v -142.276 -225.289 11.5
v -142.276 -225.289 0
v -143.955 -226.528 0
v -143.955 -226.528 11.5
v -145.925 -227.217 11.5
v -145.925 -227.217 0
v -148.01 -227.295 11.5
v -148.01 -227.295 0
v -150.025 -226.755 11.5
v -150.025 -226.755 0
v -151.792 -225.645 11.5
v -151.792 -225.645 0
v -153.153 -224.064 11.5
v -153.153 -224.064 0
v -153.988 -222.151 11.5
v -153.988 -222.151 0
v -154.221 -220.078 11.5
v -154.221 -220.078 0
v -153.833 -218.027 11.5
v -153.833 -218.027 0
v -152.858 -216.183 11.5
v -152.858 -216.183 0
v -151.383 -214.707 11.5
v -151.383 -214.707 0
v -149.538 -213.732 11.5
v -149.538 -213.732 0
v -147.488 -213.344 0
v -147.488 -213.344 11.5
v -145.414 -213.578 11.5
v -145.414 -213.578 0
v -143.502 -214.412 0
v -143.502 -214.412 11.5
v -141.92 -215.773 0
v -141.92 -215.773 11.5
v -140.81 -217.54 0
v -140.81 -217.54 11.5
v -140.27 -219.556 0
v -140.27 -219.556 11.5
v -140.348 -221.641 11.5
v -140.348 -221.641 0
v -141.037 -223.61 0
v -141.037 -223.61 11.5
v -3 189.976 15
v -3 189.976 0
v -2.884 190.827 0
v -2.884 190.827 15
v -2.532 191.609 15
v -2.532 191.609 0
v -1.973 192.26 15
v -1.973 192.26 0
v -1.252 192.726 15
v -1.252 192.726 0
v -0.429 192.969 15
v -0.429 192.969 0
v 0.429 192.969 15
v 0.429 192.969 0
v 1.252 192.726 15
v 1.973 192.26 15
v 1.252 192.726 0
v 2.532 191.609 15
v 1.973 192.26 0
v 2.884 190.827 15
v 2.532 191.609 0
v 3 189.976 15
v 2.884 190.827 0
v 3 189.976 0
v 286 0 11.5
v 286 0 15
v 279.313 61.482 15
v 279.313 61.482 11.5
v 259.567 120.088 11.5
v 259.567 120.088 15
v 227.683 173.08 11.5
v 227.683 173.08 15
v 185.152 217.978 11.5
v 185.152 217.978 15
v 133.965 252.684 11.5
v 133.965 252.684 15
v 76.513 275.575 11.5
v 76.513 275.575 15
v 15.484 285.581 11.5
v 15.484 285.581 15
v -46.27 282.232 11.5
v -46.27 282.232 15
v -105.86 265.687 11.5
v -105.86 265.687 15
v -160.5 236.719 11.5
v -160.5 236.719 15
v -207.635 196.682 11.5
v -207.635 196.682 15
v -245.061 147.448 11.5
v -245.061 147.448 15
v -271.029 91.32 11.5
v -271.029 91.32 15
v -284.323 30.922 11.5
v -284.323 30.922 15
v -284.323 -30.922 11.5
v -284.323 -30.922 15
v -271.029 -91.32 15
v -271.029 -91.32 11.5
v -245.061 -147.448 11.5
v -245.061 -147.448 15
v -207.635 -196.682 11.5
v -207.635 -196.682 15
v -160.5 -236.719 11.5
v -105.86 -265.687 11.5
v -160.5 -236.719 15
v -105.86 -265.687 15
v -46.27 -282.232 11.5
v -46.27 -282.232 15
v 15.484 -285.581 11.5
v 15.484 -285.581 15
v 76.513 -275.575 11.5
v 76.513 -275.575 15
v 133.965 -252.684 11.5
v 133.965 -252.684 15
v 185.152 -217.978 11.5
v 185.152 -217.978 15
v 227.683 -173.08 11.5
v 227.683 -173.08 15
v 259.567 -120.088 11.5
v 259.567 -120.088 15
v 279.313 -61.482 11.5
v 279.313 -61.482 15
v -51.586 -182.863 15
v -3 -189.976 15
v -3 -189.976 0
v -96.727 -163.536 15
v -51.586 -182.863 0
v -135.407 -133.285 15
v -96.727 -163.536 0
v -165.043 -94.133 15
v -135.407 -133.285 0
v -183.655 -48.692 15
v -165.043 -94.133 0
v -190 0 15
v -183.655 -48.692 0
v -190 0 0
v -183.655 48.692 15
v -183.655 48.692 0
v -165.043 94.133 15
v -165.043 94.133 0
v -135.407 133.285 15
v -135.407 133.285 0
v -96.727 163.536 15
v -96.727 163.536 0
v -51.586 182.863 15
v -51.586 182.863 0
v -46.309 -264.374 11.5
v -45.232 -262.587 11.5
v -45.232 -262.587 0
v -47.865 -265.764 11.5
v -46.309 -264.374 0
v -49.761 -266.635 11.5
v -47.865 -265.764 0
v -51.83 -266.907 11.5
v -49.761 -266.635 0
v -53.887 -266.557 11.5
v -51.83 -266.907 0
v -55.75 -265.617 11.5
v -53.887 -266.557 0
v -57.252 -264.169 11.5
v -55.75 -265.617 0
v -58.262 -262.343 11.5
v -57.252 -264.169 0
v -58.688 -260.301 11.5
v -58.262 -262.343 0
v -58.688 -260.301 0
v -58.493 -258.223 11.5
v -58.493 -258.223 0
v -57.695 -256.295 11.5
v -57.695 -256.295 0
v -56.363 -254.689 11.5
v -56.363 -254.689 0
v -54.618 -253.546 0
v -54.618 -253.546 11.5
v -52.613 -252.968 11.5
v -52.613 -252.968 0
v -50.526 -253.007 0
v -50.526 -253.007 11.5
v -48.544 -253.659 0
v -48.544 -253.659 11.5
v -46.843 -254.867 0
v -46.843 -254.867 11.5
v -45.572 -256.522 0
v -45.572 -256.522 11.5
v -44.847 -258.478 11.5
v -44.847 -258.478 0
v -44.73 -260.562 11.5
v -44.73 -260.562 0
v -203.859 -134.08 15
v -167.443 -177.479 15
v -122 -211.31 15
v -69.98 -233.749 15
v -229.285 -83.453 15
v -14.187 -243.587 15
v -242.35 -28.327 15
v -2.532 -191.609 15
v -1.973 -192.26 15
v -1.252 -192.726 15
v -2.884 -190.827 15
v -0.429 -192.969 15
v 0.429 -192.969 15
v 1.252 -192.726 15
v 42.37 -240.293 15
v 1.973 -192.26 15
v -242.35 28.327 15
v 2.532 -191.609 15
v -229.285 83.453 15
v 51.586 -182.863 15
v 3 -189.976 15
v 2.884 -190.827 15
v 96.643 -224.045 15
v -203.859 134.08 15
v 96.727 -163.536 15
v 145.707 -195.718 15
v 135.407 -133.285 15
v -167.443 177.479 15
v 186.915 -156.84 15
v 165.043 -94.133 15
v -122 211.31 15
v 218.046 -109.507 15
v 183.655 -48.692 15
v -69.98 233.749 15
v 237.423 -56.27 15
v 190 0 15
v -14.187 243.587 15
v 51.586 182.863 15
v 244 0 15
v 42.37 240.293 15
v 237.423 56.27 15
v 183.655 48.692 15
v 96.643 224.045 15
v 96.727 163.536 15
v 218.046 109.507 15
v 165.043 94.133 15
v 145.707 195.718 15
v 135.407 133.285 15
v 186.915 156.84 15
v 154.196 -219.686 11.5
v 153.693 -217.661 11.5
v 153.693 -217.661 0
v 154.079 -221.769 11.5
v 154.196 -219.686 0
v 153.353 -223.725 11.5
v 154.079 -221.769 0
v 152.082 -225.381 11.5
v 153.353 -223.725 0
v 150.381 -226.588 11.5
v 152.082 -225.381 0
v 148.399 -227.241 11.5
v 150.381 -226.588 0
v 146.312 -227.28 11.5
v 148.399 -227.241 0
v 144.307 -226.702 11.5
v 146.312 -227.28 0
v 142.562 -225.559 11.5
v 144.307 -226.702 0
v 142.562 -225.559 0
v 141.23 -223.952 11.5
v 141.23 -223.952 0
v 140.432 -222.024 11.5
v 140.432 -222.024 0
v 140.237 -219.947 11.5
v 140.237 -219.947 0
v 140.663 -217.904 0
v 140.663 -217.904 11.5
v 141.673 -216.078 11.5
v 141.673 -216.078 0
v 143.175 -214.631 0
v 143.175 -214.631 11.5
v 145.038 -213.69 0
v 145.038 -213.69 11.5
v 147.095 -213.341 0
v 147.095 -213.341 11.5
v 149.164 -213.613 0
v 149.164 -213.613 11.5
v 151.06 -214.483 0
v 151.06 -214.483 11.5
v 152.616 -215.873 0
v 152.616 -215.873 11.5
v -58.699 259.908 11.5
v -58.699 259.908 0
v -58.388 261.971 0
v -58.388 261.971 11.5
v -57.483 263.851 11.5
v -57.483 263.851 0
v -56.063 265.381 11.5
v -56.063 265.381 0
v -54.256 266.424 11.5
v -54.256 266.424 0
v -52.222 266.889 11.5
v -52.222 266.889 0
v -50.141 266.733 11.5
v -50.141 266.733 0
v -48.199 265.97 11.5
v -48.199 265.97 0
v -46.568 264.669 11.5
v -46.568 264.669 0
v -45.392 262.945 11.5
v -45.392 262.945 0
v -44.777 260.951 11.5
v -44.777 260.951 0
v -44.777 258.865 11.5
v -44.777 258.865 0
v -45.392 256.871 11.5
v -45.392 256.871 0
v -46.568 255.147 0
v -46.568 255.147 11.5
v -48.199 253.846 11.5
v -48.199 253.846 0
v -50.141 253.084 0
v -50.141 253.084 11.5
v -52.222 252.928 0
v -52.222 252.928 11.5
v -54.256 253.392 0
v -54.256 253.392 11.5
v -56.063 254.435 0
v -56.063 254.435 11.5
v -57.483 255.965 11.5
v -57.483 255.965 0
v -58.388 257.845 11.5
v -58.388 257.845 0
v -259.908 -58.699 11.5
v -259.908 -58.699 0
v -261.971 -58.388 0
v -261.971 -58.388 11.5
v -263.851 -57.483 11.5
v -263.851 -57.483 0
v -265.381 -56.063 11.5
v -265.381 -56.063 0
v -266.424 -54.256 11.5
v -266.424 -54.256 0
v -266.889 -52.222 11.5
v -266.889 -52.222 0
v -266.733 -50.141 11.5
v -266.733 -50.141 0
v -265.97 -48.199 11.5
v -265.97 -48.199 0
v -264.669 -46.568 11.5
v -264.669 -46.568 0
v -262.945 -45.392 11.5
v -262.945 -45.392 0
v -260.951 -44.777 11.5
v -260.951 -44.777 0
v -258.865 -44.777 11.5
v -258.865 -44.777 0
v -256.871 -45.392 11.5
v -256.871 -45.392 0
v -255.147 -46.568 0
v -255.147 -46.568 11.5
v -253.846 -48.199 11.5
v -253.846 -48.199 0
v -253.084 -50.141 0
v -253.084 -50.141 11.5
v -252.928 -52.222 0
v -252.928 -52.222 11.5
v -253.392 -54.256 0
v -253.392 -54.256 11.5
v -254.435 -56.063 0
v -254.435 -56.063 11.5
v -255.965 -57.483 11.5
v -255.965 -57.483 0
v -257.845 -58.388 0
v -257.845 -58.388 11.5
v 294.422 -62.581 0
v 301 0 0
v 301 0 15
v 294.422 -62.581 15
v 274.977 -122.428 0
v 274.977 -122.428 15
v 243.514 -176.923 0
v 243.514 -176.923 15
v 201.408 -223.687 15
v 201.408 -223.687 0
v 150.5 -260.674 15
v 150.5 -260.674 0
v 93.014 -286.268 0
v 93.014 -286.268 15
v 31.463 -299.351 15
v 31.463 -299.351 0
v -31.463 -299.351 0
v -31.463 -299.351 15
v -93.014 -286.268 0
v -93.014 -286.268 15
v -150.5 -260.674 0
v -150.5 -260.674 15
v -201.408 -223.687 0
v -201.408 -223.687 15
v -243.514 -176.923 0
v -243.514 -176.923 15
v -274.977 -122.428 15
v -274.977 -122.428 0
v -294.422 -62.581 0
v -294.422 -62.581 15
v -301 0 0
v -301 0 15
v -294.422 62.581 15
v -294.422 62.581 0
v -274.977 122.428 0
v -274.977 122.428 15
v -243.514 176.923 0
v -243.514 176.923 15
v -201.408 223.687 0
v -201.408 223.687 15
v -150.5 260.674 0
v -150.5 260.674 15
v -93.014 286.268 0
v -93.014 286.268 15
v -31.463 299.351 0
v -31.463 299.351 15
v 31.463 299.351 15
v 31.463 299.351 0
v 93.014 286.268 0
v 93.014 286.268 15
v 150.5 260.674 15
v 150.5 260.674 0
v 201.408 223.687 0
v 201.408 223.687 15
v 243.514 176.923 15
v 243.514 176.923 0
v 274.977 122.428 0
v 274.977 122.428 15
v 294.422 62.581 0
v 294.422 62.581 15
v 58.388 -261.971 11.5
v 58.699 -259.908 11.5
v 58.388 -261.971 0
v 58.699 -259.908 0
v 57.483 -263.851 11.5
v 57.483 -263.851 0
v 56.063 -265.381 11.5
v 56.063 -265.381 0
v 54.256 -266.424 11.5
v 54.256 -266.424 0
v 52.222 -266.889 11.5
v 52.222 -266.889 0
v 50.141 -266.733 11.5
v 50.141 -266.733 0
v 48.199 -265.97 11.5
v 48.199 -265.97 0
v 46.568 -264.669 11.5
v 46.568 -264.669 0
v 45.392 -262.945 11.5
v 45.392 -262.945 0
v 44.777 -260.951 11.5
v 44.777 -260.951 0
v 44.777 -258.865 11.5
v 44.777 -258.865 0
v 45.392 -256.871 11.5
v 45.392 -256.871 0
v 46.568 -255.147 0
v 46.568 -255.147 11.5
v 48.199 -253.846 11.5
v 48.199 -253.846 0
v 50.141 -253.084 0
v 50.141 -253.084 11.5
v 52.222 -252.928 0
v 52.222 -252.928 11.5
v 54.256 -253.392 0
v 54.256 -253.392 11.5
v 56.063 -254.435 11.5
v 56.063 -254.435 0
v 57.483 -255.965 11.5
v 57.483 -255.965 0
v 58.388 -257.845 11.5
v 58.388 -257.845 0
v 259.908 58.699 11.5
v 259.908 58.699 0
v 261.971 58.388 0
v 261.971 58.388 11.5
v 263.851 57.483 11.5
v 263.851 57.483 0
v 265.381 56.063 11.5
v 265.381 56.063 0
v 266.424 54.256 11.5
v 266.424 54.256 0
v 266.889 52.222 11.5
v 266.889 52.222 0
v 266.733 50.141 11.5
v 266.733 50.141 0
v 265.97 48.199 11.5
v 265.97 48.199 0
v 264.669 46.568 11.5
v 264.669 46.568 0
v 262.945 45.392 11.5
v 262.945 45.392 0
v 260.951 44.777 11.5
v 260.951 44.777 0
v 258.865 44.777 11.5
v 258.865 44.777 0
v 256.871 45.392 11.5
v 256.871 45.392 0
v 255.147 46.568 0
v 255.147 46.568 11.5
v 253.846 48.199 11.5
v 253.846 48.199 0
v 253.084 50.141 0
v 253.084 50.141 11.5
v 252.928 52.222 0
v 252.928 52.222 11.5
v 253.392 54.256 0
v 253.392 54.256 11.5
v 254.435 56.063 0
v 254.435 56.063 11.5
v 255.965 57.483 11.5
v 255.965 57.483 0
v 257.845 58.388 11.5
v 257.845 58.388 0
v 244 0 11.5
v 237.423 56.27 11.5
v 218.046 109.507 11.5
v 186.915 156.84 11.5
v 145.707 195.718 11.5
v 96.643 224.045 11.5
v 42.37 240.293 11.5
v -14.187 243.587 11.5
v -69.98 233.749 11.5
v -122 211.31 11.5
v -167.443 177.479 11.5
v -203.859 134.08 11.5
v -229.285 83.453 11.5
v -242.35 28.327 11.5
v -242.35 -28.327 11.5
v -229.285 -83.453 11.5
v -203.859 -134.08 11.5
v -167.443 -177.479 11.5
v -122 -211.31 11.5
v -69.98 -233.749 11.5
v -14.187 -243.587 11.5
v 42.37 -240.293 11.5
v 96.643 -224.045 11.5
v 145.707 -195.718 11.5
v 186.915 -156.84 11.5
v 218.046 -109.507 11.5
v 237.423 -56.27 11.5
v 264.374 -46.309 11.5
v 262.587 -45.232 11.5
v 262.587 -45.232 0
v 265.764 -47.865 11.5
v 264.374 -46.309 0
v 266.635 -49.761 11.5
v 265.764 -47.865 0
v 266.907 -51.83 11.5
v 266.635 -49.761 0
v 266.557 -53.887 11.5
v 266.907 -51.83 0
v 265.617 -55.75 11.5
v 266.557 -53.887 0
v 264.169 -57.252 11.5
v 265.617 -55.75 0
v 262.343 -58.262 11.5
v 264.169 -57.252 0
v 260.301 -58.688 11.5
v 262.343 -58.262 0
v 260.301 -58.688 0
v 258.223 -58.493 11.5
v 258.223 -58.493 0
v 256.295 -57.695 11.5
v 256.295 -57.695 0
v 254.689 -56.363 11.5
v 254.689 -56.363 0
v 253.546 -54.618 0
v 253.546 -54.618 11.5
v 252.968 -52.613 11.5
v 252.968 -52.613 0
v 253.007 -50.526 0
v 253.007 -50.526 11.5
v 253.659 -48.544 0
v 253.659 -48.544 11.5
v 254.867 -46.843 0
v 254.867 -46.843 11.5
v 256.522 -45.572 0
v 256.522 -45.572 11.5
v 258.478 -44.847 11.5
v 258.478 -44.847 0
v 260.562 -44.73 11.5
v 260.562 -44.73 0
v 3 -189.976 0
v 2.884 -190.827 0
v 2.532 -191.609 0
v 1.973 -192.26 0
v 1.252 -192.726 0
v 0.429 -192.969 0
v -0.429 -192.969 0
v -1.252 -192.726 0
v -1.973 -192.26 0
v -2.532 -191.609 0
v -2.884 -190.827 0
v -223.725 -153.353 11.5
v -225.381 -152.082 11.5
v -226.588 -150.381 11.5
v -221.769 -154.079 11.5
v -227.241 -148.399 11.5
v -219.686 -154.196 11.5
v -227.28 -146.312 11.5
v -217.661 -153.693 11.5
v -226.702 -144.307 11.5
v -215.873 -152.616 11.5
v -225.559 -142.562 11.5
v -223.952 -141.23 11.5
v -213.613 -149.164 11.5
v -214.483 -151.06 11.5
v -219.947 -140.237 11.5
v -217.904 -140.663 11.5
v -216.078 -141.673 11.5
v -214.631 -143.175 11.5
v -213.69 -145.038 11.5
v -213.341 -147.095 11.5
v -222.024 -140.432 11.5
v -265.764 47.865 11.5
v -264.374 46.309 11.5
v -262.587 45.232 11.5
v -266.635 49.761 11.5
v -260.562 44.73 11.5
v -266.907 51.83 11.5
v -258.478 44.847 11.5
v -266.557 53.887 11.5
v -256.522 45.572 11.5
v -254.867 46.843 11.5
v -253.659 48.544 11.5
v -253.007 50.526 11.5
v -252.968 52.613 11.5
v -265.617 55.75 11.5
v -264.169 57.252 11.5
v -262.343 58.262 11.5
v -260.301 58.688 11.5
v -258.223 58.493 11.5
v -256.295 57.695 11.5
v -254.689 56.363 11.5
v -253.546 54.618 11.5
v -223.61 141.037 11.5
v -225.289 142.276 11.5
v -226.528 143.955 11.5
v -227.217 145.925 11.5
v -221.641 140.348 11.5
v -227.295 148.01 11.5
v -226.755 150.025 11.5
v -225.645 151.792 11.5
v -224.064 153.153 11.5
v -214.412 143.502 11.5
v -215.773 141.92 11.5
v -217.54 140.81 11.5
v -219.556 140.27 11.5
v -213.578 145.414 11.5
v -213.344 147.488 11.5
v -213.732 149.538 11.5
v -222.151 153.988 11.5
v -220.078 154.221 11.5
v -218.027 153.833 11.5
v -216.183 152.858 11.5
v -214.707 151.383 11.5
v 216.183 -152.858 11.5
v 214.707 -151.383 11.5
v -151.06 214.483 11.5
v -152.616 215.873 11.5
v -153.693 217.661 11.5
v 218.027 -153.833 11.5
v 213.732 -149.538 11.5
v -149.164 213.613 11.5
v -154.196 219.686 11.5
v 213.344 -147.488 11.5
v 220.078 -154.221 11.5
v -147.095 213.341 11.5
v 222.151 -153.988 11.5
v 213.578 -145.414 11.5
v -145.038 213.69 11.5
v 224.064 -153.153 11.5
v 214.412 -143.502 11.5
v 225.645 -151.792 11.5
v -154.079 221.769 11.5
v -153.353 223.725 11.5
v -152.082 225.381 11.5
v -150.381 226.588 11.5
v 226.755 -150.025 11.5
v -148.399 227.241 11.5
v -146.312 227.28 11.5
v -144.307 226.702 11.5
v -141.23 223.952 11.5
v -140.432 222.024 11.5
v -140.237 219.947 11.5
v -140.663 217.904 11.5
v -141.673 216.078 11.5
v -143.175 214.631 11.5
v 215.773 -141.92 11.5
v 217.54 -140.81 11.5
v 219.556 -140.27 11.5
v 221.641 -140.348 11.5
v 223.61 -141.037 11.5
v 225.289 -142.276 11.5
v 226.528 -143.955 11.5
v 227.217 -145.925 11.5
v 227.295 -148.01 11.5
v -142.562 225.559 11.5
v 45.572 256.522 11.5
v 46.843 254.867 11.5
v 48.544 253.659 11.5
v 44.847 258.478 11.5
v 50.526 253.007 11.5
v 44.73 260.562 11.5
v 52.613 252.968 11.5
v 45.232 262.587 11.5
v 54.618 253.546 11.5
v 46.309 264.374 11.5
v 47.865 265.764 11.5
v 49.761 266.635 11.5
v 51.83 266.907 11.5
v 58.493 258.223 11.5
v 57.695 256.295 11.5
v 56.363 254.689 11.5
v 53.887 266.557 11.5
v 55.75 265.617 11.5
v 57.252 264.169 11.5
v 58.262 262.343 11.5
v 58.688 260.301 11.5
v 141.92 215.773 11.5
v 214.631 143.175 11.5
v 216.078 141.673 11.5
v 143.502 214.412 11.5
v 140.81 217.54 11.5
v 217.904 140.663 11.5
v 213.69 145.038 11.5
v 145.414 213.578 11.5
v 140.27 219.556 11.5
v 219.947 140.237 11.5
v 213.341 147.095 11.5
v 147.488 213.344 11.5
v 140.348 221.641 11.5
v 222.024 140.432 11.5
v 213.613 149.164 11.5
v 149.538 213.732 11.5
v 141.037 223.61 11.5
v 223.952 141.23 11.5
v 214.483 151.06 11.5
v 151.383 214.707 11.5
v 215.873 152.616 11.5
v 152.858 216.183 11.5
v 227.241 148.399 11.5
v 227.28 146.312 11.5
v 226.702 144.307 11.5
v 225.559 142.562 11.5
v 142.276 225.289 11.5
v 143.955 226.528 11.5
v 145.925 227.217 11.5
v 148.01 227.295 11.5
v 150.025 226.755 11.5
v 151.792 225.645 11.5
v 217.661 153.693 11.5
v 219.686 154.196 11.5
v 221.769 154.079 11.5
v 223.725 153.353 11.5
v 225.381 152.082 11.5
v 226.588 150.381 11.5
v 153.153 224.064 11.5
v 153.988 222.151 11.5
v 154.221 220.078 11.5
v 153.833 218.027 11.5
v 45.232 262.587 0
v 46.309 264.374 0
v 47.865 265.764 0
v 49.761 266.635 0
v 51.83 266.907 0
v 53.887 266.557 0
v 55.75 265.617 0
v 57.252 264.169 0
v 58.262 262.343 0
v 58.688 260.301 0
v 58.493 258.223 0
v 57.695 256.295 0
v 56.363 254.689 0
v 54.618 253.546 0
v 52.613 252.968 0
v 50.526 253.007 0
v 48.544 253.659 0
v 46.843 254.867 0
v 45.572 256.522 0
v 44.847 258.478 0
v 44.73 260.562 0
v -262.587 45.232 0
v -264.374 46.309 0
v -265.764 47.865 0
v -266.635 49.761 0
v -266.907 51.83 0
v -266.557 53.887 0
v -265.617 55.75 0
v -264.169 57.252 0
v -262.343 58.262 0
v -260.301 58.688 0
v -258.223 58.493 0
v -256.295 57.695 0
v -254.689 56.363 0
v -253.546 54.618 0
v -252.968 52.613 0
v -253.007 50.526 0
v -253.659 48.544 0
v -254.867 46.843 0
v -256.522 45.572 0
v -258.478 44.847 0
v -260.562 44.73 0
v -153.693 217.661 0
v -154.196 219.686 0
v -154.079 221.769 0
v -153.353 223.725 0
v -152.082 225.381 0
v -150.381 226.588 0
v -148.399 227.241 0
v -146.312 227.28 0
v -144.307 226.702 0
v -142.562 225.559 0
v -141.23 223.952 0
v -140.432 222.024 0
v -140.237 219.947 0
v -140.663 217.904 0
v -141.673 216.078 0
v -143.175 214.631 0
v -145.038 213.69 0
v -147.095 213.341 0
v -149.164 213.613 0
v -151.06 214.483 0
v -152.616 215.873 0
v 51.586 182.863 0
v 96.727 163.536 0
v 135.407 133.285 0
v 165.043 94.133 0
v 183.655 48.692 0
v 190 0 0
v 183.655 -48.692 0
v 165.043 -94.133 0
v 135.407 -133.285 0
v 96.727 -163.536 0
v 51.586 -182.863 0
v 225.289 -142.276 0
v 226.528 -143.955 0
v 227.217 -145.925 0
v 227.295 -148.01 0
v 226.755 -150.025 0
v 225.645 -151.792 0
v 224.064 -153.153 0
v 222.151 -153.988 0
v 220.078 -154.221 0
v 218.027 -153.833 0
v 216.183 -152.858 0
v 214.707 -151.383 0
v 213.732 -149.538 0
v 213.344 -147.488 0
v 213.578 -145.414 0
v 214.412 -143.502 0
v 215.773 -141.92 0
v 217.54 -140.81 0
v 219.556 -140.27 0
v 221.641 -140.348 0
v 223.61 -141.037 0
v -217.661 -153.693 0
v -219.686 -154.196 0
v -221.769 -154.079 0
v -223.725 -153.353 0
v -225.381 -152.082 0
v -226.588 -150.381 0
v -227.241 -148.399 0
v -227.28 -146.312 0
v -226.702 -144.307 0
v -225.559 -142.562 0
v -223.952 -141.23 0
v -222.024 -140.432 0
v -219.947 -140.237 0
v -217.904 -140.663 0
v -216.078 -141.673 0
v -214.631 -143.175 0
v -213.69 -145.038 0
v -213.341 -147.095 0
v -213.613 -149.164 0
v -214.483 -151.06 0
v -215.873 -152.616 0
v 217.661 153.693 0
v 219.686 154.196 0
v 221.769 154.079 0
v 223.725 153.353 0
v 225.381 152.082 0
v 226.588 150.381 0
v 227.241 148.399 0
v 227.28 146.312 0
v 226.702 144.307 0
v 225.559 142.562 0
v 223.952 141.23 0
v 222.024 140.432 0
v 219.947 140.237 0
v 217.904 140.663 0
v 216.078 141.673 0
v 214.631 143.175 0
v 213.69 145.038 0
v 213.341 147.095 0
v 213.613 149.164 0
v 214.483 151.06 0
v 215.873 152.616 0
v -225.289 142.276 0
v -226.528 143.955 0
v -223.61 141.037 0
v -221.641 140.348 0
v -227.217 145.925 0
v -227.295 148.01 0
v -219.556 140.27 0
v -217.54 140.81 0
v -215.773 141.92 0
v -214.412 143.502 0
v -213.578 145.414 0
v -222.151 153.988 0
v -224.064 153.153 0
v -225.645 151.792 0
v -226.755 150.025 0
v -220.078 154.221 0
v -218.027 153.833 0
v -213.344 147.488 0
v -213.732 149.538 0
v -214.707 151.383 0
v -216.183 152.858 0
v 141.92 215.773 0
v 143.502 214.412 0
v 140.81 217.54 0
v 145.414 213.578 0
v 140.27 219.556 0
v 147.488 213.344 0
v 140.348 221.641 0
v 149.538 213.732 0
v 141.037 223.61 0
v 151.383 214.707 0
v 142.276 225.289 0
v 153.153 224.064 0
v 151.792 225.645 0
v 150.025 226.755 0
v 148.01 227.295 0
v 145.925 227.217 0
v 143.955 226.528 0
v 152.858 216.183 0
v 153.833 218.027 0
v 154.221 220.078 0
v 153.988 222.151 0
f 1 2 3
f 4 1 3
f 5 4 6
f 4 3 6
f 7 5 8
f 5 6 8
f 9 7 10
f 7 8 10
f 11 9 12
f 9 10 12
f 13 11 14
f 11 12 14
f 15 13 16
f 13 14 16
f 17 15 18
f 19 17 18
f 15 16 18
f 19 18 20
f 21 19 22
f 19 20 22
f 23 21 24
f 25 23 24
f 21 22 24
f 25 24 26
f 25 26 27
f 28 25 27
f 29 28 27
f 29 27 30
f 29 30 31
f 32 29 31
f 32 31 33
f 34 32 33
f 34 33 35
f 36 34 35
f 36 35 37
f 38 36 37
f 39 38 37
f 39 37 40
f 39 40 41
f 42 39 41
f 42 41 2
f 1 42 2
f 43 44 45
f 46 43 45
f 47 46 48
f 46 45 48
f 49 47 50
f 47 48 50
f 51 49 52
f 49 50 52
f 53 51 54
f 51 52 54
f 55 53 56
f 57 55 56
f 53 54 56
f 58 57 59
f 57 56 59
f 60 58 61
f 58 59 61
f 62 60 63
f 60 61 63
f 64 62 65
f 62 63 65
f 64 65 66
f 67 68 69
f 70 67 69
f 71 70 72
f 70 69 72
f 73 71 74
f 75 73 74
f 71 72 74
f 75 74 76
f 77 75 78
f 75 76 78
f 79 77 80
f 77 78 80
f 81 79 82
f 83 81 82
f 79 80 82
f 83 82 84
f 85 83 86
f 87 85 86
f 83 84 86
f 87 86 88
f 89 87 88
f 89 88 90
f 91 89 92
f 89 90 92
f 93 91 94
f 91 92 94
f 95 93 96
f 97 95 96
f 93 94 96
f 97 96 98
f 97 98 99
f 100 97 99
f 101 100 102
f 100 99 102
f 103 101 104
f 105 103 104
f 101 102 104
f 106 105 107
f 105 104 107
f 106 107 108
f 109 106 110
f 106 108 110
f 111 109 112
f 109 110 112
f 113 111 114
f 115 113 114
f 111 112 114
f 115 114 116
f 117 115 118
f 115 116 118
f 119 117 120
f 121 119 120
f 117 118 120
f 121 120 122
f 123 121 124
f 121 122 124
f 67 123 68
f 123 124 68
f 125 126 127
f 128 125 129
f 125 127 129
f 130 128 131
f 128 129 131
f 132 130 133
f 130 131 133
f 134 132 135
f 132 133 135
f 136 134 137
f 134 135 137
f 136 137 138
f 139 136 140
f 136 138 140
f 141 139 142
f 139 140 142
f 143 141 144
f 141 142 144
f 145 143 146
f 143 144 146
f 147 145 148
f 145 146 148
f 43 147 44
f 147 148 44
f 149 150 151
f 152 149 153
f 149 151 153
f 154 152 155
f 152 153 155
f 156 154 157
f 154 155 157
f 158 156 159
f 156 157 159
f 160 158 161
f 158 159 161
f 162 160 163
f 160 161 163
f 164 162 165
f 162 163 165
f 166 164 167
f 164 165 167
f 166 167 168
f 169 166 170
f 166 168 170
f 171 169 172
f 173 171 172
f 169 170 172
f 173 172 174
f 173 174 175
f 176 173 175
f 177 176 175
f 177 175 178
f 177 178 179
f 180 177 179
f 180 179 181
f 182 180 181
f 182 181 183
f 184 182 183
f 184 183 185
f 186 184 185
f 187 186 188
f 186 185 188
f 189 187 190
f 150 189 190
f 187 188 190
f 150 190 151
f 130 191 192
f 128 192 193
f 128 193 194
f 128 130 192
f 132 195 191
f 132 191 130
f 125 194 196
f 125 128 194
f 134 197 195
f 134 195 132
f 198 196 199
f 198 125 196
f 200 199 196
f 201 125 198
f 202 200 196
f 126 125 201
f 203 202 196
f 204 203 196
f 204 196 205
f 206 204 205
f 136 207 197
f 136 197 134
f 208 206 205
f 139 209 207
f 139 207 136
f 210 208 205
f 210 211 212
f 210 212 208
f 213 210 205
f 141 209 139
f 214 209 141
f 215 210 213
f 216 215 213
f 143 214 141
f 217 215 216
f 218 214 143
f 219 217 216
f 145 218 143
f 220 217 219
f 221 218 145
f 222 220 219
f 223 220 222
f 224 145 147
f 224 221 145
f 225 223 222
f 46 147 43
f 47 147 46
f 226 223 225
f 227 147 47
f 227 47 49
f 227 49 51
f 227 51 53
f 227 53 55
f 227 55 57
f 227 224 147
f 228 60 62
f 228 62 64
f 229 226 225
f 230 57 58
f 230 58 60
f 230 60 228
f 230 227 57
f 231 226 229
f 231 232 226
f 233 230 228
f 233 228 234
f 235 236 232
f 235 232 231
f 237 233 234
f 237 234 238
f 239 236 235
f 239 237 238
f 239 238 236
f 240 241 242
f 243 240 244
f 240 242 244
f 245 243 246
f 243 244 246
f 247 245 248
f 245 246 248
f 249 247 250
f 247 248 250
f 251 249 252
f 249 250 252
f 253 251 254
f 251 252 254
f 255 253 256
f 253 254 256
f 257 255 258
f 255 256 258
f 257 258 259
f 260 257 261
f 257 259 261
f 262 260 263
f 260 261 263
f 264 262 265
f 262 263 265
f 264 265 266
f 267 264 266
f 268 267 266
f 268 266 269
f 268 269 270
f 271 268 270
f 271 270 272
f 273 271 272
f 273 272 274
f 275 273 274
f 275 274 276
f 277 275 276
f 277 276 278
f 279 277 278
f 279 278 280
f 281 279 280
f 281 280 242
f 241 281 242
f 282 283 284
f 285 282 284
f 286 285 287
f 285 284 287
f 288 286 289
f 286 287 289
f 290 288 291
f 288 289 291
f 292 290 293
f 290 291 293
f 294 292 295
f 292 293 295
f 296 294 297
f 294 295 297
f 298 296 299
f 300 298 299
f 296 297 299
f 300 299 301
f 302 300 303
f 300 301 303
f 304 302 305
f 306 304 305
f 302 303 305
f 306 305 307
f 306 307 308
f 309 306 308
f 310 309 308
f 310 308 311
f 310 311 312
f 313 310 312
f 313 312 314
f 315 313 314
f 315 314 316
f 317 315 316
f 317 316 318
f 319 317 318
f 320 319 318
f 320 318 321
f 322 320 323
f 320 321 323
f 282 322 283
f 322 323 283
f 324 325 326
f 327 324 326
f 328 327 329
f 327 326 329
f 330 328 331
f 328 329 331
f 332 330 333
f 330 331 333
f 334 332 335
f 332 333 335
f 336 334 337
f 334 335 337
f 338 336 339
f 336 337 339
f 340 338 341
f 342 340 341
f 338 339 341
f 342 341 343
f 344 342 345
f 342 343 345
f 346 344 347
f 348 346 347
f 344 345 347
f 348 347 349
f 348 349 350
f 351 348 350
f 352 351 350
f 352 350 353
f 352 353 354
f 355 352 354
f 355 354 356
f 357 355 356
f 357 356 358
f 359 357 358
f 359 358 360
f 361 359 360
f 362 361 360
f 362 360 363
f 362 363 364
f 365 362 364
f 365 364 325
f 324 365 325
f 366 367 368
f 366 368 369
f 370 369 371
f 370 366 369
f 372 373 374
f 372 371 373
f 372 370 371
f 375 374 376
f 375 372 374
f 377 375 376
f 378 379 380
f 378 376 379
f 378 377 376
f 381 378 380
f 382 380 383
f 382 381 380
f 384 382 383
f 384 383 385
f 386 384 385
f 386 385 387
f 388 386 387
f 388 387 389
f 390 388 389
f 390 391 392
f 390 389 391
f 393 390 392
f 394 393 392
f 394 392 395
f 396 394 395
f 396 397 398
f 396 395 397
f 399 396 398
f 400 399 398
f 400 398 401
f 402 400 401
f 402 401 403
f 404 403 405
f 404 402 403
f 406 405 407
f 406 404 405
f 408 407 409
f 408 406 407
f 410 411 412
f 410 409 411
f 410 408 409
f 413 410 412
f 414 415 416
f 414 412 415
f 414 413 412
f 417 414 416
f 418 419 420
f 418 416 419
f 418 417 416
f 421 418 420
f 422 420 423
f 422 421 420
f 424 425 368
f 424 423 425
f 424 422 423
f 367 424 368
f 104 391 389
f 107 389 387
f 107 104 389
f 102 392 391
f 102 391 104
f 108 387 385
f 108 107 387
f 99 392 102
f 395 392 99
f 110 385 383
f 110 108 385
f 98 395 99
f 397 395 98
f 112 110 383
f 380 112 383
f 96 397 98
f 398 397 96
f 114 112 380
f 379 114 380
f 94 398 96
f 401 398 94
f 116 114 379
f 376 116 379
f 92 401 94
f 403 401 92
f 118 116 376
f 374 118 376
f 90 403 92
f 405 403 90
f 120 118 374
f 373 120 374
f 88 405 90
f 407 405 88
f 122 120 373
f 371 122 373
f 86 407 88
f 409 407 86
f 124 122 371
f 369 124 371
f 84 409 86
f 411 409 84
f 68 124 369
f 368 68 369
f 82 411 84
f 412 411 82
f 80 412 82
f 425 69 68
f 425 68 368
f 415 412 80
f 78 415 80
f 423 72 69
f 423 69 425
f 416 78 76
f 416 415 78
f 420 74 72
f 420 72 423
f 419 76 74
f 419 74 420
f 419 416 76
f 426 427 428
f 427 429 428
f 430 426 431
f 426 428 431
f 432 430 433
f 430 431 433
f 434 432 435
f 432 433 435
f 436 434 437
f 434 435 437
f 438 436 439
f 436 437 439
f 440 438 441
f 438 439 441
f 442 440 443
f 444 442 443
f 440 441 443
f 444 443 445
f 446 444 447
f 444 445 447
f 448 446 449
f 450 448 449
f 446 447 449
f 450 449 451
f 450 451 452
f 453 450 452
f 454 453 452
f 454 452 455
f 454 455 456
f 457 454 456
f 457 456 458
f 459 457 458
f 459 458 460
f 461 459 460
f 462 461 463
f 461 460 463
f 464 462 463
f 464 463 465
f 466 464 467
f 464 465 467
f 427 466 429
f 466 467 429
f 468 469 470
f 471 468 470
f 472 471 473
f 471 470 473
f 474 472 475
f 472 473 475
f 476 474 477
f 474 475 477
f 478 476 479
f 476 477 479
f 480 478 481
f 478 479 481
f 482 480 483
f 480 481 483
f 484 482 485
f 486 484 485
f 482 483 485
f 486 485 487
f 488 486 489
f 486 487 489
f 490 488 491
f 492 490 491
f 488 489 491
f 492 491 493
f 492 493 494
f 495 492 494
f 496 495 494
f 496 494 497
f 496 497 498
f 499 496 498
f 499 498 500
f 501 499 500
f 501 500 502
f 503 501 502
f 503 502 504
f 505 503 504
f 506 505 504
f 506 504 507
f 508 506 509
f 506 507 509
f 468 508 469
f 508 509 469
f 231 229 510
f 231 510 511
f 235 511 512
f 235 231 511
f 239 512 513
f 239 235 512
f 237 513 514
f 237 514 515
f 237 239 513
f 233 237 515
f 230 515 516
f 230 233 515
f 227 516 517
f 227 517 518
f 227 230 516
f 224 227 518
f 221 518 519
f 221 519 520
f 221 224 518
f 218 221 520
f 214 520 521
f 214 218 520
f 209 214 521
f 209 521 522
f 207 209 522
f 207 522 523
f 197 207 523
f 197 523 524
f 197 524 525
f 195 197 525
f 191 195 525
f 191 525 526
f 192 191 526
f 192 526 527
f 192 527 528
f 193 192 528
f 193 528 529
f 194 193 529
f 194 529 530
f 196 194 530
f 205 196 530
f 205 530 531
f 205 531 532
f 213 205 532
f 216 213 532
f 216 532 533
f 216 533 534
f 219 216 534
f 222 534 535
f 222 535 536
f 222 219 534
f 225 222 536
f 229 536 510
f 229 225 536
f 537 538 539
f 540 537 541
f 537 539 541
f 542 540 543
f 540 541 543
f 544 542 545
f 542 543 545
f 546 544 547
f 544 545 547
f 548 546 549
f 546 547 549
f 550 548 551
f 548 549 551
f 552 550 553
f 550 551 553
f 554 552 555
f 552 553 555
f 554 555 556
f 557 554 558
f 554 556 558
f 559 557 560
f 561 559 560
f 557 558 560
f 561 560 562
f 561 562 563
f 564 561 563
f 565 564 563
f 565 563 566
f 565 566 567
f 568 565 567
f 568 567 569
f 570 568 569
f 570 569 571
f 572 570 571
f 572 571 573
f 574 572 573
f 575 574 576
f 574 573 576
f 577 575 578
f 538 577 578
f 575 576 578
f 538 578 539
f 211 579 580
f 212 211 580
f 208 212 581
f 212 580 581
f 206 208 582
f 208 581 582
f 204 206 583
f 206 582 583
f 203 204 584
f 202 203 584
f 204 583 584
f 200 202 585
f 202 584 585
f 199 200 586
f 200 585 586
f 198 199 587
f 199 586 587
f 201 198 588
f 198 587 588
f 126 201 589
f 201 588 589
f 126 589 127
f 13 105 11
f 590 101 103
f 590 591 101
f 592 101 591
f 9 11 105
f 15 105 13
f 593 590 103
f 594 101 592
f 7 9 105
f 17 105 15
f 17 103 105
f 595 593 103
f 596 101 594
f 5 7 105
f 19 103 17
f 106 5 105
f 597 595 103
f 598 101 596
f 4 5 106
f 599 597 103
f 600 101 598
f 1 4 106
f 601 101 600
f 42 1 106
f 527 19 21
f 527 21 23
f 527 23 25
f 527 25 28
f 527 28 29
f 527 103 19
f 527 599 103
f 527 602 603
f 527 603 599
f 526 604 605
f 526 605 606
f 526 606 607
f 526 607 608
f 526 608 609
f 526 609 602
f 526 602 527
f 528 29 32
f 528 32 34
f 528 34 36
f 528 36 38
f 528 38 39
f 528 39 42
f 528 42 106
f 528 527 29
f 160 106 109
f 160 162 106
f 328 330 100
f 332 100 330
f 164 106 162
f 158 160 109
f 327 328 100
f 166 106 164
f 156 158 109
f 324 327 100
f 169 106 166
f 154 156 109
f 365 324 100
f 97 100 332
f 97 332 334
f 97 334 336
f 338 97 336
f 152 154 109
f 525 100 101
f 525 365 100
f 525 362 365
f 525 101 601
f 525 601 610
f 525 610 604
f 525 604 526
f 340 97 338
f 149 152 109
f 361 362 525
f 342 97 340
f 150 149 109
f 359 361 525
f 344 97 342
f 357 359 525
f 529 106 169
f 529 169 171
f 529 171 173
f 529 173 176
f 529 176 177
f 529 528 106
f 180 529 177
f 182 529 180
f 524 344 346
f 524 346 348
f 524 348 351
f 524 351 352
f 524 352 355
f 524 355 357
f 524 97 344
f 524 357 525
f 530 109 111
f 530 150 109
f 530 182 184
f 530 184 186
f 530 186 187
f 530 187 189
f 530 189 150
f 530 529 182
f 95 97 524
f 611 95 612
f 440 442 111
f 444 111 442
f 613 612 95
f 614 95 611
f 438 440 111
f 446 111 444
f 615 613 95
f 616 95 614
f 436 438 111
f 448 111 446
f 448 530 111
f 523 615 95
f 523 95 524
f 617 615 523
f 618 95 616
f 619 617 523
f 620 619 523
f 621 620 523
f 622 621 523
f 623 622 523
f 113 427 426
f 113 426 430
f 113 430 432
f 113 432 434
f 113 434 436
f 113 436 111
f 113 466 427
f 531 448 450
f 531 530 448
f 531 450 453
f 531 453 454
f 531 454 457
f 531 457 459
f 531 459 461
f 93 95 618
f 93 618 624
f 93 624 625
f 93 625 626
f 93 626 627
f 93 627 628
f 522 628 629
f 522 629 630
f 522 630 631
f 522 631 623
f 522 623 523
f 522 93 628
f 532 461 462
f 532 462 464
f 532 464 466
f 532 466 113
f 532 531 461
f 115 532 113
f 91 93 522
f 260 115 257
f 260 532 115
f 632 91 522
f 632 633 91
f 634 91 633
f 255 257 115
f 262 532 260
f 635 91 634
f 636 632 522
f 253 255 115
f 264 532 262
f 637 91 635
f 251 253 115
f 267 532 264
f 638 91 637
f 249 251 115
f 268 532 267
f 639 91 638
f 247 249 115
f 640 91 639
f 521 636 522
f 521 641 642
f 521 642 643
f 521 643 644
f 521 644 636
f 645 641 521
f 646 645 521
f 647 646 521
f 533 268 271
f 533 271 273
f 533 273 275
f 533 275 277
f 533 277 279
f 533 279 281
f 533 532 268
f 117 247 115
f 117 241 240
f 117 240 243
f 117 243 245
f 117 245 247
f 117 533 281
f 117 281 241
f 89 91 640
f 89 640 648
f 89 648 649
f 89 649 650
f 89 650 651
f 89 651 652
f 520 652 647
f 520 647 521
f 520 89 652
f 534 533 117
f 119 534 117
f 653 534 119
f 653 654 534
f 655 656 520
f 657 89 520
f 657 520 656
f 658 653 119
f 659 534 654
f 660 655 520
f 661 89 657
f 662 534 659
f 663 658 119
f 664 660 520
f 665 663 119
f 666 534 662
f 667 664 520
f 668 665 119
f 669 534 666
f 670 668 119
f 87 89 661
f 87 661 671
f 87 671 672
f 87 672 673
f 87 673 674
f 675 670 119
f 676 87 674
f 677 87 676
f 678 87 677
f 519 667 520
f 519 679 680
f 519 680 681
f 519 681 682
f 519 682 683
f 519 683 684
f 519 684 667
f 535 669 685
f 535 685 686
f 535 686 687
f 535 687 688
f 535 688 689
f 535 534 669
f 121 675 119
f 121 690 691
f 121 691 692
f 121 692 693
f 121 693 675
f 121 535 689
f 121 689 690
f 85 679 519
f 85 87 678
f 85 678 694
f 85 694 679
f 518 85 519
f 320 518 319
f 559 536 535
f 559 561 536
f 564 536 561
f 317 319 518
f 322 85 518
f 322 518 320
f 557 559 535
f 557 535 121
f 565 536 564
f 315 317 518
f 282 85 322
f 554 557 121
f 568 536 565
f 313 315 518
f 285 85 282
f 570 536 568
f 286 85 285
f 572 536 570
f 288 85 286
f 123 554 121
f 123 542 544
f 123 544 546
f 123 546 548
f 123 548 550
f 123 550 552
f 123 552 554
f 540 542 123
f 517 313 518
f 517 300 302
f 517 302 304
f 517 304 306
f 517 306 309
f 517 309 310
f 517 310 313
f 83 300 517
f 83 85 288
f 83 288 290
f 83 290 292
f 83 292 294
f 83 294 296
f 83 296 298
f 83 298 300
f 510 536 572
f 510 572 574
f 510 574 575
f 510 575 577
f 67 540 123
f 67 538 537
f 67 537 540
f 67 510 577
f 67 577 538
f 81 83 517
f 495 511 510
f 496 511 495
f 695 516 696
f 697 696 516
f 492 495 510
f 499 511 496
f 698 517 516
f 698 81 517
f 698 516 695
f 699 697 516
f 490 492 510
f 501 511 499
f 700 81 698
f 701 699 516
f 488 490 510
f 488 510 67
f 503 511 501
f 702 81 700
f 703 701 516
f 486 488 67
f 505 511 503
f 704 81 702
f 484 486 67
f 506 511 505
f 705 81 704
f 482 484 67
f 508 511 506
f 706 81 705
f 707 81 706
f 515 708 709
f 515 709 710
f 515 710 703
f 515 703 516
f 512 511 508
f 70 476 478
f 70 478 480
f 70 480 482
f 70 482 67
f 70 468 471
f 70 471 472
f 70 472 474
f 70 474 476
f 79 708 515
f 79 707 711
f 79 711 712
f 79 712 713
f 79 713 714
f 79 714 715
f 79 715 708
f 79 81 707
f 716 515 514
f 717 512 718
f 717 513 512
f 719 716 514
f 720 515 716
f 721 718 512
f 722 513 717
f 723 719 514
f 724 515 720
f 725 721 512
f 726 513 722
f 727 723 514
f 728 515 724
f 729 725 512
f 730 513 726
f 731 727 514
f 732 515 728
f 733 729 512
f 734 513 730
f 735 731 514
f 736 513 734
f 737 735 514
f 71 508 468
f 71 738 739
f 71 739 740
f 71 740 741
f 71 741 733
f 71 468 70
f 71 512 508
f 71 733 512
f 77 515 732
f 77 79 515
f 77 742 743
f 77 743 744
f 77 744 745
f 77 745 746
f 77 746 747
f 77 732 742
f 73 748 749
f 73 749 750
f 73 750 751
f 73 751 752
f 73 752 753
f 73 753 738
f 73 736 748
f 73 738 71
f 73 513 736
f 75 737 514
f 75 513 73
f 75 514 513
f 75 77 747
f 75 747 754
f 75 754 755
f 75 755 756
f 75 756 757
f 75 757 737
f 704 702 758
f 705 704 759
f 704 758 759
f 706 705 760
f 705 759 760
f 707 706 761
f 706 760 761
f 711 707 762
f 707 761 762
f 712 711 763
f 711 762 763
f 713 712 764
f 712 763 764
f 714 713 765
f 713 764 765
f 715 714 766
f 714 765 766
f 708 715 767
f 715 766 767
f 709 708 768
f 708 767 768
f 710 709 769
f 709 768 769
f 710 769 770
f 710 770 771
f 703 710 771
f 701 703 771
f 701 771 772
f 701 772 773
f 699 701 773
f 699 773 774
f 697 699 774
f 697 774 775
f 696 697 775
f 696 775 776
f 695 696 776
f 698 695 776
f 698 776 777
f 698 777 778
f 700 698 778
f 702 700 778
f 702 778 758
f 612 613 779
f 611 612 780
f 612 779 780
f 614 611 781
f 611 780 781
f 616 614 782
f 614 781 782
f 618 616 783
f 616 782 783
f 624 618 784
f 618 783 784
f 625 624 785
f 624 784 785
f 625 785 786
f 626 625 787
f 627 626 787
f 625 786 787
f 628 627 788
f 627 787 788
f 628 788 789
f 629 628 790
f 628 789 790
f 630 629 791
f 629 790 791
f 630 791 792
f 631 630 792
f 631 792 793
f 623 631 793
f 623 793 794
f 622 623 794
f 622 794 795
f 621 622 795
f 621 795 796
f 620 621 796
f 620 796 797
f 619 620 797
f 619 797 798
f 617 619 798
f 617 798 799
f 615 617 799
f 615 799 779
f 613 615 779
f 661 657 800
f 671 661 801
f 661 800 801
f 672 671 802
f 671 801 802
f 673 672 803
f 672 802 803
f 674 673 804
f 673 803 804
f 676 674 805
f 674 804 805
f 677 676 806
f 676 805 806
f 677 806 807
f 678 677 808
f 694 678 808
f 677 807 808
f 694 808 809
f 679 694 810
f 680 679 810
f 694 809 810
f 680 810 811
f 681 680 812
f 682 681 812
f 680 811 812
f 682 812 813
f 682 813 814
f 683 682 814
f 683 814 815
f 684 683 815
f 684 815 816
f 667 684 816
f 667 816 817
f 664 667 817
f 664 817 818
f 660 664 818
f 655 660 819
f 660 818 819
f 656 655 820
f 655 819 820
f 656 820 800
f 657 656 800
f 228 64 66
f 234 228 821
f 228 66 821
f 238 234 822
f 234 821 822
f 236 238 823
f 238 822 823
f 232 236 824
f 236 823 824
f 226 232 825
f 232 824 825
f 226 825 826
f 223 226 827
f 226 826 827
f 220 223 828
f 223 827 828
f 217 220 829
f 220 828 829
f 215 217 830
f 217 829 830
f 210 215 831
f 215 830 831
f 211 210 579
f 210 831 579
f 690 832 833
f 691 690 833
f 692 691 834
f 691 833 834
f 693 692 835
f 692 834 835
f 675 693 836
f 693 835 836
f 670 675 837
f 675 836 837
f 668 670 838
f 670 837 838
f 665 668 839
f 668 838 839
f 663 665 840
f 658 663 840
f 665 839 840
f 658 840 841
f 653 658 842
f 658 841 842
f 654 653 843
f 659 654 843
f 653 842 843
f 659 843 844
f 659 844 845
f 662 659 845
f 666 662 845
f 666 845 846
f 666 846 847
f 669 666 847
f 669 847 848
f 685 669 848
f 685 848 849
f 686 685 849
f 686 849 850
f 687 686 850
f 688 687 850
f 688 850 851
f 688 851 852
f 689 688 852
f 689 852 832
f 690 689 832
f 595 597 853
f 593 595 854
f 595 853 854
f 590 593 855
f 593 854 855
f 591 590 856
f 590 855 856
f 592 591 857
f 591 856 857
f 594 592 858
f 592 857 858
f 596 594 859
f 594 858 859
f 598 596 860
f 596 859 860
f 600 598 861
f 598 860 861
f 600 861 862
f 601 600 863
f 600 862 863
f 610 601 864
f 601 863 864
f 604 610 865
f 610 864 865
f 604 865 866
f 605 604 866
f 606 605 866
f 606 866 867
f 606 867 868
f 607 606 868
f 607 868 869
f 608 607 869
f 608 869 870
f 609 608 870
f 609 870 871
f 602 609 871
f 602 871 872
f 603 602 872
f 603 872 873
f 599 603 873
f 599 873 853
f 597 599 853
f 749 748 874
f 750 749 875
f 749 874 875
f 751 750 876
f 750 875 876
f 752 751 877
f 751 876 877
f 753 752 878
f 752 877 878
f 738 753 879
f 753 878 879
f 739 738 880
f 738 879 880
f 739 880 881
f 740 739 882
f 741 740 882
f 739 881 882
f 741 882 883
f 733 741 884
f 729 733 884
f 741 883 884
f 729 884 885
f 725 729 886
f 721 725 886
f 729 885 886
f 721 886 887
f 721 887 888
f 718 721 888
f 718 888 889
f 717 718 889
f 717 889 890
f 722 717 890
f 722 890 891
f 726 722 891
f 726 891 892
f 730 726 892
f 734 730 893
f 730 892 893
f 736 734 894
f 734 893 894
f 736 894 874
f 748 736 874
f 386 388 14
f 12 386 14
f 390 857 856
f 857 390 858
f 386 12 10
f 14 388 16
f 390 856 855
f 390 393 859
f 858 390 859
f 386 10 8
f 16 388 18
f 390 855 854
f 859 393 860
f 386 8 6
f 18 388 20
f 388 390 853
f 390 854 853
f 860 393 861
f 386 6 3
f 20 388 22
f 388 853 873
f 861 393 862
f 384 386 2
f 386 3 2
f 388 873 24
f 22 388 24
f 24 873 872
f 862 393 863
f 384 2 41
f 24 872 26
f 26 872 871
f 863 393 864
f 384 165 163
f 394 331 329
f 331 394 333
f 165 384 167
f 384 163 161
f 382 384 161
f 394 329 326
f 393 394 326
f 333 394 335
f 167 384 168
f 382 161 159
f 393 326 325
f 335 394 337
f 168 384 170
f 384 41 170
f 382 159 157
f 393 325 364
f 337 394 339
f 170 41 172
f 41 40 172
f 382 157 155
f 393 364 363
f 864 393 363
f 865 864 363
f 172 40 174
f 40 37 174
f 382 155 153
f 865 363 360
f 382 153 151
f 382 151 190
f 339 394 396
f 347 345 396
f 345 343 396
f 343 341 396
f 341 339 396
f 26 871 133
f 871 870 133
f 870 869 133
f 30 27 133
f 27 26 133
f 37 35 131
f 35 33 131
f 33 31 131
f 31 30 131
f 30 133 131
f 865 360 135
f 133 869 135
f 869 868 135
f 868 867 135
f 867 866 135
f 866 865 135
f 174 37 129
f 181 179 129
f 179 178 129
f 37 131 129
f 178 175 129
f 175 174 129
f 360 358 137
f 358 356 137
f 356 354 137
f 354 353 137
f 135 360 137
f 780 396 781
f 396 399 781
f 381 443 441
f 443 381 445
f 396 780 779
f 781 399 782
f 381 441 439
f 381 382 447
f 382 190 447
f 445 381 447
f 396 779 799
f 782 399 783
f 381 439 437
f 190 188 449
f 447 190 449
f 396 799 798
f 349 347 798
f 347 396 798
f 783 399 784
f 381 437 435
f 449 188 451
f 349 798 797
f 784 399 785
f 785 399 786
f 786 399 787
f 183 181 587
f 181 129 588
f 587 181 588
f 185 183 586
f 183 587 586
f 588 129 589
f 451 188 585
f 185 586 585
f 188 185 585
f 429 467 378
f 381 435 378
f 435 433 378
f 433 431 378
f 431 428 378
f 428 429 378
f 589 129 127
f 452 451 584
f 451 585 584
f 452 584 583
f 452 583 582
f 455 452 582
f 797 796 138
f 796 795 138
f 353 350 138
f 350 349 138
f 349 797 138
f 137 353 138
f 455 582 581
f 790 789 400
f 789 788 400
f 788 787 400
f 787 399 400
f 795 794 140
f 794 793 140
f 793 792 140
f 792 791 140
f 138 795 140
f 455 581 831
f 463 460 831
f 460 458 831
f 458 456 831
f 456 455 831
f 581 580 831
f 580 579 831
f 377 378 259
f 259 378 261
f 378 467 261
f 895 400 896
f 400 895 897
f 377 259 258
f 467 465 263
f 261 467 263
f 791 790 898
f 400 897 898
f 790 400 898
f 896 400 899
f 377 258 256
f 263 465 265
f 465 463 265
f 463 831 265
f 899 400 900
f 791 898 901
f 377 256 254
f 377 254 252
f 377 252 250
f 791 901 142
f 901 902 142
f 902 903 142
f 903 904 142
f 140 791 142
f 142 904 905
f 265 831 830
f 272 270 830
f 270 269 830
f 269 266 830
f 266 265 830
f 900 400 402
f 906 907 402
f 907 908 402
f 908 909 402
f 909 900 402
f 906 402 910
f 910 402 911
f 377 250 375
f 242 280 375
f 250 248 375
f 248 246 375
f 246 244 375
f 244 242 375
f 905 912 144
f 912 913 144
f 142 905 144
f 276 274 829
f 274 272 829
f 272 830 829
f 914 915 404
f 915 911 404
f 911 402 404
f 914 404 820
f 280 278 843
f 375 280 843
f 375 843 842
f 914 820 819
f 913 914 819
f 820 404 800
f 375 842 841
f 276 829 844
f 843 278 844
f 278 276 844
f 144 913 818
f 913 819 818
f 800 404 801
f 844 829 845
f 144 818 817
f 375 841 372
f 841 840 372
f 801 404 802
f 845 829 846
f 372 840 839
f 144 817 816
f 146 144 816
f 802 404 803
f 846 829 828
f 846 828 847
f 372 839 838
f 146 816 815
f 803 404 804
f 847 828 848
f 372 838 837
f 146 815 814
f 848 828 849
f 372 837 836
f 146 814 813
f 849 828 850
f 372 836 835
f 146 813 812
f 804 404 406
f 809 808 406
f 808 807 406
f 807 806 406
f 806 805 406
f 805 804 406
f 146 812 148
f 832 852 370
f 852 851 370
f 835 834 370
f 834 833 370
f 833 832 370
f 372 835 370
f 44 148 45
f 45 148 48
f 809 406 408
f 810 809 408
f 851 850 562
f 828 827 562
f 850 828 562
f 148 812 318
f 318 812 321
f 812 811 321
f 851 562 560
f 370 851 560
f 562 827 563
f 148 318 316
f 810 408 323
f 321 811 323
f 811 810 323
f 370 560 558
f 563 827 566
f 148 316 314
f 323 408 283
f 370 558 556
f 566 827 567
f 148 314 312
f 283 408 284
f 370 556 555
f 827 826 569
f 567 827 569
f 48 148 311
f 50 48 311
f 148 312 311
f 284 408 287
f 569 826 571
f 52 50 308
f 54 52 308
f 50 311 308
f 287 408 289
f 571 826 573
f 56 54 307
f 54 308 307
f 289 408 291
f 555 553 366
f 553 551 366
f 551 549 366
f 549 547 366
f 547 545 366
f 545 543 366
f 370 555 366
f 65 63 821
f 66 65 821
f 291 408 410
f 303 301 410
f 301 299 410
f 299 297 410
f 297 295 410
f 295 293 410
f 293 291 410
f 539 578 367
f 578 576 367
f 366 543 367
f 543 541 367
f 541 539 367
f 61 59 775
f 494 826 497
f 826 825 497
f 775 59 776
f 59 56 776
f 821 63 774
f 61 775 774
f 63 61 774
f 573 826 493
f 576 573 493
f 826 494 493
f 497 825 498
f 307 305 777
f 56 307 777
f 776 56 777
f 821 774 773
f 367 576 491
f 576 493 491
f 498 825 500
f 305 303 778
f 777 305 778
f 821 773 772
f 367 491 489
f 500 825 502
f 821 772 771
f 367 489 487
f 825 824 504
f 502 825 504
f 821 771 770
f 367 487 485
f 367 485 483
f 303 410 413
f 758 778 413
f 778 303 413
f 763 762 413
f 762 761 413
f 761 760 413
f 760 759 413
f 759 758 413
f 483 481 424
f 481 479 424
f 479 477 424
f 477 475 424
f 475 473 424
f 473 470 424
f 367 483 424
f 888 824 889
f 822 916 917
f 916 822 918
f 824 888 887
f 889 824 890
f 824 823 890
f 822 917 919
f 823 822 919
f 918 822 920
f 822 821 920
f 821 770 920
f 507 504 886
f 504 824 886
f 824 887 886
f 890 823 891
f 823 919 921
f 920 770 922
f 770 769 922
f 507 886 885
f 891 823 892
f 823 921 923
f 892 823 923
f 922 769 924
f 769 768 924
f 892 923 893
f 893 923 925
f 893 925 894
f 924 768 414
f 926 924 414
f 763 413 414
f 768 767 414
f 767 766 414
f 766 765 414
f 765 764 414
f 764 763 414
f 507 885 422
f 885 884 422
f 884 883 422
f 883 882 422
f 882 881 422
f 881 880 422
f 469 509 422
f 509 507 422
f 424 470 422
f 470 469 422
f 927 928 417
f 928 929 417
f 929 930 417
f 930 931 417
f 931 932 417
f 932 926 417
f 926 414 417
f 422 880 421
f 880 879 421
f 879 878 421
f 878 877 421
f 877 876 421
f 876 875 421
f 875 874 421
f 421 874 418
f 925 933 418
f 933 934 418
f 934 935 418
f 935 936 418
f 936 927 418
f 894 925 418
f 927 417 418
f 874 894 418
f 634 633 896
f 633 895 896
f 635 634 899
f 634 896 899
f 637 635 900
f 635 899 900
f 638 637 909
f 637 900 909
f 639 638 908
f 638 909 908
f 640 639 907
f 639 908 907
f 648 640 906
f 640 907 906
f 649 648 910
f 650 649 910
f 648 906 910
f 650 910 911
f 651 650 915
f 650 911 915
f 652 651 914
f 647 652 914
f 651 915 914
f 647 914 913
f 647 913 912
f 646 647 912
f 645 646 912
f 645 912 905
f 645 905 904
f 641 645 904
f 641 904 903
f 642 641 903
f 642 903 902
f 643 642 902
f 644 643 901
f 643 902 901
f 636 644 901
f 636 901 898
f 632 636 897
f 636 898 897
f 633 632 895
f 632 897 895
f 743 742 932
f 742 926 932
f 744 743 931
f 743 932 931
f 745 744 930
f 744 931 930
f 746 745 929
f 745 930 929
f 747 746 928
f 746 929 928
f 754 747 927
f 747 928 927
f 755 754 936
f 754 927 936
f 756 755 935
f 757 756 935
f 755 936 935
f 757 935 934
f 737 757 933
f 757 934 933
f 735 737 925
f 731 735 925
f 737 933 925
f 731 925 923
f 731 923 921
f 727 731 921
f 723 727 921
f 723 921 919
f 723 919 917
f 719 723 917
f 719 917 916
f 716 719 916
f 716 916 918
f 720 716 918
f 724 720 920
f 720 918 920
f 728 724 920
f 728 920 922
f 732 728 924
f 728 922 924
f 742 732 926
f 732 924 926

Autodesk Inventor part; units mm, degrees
ref_plane "YZ Plane" through (0, 0, 0) normal (1, 0, 0) x (0, 1, 0)
ref_plane "XZ Plane" through (0, 0, 0) normal (0, 1, 0) x (-1, 0, 0)
ref_plane "XY Plane" through (0, 0, 0) normal (0, 0, 1) x (1, 0, 0)
sketch "Sketch1" plane through (0, 0, 0) normal (0, 0, 1) x (1, 0, 0)
  circle A0 centre (0, 0) radius 190
  circle A1 centre (0, 0) radius 301
  circle A2 centre (0, 0) radius 265 construction
  point P0 (0, 265)
  dimension "d17" = 530
  dimension "d41" = 602
  dimension "d42" = 380
extrude "Extrusion1" add sketch "Sketch1" along normal blind 15
sketch "Sketch2" plane through (0, 0, 15) normal (0, 0, 1) x (1, 0, 0)
  circle A0 centre (0, 0) radius 301 construction
  circle A1 centre (0, 0) radius 190 construction
  line L0 (0, 286) -> (0, 244) construction
  line L1 (0, 190) -> (0, 0) construction
  circle A2 centre (0, 0) radius 244
  circle A3 centre (0, 0) radius 286
  circle A4 centre (0, 0) radius 265 construction
  point P0 (0, 265)
  dimension "d19" = 530
  dimension "d4" = 42
extrude "Extrusion2" cut sketch "Sketch2" against normal blind 3.5
sketch "Sketch3" plane through (0, 0, 0) normal (0, 0, 1) x (1, 0, 0)
  circle A0 centre (0, 0) radius 190 construction
  circle A1 centre (0, 0) radius 301 construction
  circle A2 centre (0, 0) radius 244 projected
  circle A3 centre (0, 0) radius 286 projected
  circle A4 centre (0, 0) radius 301 projected
  line L0 (0, 0) -> (0, -301) construction
  line L1 (0, 0) -> (58.7222, -295.2164) construction
  line L2 (47.602, -239.3116) -> (55.7958, -280.5046) construction
  circle A5 centre (51.6989, -259.9081) radius 7
  dimension "d20" = 11.25
  dimension "d21" = 14
extrude "Extrusion3" cut sketch "Sketch3" along normal through all contours A5
pattern_circular "Circular Pattern2" count 16 over 360 about axis through (0, 0, 0) along (0, 0, -1) of "Extrusion3"
sketch "Sketch5" plane through (0, 0, 0) normal (0, 0, -1) x (-1, 0, 0)
  circle A0 centre (0, 0) radius 301 projected
  circle A1 centre (0, 0) radius 190 projected
  line L0 (0, 0) -> (0, 190) construction
  arc A2 (2.9999, 189.9763) -> (-2.9999, 189.9763) centre (0, 190) ccw
  dimension "d40" = 6
extrude "Extrusion4" cut sketch "Sketch5" against normal through all contours A1 A2
mirror "Mirror1" about plane through (0, 0, 0) normal (0, 1, 0) of "Extrusion4"
equation "\"d17\" = Шпил_пласт_КОРМА_диам_центров"
equation "\"d19\" = Шпил_пласт_КОРМА_диам_центров"
equation "\"BendReliefDepth\" = 0.5 * Thickness"
equation "\"Шпил_пласт_КОРМА_диам_центров\" = 530"
equation "\"Thickness\" = 10"
properties part number "ДМФ 025 кольцо прижимное корма наружное"
